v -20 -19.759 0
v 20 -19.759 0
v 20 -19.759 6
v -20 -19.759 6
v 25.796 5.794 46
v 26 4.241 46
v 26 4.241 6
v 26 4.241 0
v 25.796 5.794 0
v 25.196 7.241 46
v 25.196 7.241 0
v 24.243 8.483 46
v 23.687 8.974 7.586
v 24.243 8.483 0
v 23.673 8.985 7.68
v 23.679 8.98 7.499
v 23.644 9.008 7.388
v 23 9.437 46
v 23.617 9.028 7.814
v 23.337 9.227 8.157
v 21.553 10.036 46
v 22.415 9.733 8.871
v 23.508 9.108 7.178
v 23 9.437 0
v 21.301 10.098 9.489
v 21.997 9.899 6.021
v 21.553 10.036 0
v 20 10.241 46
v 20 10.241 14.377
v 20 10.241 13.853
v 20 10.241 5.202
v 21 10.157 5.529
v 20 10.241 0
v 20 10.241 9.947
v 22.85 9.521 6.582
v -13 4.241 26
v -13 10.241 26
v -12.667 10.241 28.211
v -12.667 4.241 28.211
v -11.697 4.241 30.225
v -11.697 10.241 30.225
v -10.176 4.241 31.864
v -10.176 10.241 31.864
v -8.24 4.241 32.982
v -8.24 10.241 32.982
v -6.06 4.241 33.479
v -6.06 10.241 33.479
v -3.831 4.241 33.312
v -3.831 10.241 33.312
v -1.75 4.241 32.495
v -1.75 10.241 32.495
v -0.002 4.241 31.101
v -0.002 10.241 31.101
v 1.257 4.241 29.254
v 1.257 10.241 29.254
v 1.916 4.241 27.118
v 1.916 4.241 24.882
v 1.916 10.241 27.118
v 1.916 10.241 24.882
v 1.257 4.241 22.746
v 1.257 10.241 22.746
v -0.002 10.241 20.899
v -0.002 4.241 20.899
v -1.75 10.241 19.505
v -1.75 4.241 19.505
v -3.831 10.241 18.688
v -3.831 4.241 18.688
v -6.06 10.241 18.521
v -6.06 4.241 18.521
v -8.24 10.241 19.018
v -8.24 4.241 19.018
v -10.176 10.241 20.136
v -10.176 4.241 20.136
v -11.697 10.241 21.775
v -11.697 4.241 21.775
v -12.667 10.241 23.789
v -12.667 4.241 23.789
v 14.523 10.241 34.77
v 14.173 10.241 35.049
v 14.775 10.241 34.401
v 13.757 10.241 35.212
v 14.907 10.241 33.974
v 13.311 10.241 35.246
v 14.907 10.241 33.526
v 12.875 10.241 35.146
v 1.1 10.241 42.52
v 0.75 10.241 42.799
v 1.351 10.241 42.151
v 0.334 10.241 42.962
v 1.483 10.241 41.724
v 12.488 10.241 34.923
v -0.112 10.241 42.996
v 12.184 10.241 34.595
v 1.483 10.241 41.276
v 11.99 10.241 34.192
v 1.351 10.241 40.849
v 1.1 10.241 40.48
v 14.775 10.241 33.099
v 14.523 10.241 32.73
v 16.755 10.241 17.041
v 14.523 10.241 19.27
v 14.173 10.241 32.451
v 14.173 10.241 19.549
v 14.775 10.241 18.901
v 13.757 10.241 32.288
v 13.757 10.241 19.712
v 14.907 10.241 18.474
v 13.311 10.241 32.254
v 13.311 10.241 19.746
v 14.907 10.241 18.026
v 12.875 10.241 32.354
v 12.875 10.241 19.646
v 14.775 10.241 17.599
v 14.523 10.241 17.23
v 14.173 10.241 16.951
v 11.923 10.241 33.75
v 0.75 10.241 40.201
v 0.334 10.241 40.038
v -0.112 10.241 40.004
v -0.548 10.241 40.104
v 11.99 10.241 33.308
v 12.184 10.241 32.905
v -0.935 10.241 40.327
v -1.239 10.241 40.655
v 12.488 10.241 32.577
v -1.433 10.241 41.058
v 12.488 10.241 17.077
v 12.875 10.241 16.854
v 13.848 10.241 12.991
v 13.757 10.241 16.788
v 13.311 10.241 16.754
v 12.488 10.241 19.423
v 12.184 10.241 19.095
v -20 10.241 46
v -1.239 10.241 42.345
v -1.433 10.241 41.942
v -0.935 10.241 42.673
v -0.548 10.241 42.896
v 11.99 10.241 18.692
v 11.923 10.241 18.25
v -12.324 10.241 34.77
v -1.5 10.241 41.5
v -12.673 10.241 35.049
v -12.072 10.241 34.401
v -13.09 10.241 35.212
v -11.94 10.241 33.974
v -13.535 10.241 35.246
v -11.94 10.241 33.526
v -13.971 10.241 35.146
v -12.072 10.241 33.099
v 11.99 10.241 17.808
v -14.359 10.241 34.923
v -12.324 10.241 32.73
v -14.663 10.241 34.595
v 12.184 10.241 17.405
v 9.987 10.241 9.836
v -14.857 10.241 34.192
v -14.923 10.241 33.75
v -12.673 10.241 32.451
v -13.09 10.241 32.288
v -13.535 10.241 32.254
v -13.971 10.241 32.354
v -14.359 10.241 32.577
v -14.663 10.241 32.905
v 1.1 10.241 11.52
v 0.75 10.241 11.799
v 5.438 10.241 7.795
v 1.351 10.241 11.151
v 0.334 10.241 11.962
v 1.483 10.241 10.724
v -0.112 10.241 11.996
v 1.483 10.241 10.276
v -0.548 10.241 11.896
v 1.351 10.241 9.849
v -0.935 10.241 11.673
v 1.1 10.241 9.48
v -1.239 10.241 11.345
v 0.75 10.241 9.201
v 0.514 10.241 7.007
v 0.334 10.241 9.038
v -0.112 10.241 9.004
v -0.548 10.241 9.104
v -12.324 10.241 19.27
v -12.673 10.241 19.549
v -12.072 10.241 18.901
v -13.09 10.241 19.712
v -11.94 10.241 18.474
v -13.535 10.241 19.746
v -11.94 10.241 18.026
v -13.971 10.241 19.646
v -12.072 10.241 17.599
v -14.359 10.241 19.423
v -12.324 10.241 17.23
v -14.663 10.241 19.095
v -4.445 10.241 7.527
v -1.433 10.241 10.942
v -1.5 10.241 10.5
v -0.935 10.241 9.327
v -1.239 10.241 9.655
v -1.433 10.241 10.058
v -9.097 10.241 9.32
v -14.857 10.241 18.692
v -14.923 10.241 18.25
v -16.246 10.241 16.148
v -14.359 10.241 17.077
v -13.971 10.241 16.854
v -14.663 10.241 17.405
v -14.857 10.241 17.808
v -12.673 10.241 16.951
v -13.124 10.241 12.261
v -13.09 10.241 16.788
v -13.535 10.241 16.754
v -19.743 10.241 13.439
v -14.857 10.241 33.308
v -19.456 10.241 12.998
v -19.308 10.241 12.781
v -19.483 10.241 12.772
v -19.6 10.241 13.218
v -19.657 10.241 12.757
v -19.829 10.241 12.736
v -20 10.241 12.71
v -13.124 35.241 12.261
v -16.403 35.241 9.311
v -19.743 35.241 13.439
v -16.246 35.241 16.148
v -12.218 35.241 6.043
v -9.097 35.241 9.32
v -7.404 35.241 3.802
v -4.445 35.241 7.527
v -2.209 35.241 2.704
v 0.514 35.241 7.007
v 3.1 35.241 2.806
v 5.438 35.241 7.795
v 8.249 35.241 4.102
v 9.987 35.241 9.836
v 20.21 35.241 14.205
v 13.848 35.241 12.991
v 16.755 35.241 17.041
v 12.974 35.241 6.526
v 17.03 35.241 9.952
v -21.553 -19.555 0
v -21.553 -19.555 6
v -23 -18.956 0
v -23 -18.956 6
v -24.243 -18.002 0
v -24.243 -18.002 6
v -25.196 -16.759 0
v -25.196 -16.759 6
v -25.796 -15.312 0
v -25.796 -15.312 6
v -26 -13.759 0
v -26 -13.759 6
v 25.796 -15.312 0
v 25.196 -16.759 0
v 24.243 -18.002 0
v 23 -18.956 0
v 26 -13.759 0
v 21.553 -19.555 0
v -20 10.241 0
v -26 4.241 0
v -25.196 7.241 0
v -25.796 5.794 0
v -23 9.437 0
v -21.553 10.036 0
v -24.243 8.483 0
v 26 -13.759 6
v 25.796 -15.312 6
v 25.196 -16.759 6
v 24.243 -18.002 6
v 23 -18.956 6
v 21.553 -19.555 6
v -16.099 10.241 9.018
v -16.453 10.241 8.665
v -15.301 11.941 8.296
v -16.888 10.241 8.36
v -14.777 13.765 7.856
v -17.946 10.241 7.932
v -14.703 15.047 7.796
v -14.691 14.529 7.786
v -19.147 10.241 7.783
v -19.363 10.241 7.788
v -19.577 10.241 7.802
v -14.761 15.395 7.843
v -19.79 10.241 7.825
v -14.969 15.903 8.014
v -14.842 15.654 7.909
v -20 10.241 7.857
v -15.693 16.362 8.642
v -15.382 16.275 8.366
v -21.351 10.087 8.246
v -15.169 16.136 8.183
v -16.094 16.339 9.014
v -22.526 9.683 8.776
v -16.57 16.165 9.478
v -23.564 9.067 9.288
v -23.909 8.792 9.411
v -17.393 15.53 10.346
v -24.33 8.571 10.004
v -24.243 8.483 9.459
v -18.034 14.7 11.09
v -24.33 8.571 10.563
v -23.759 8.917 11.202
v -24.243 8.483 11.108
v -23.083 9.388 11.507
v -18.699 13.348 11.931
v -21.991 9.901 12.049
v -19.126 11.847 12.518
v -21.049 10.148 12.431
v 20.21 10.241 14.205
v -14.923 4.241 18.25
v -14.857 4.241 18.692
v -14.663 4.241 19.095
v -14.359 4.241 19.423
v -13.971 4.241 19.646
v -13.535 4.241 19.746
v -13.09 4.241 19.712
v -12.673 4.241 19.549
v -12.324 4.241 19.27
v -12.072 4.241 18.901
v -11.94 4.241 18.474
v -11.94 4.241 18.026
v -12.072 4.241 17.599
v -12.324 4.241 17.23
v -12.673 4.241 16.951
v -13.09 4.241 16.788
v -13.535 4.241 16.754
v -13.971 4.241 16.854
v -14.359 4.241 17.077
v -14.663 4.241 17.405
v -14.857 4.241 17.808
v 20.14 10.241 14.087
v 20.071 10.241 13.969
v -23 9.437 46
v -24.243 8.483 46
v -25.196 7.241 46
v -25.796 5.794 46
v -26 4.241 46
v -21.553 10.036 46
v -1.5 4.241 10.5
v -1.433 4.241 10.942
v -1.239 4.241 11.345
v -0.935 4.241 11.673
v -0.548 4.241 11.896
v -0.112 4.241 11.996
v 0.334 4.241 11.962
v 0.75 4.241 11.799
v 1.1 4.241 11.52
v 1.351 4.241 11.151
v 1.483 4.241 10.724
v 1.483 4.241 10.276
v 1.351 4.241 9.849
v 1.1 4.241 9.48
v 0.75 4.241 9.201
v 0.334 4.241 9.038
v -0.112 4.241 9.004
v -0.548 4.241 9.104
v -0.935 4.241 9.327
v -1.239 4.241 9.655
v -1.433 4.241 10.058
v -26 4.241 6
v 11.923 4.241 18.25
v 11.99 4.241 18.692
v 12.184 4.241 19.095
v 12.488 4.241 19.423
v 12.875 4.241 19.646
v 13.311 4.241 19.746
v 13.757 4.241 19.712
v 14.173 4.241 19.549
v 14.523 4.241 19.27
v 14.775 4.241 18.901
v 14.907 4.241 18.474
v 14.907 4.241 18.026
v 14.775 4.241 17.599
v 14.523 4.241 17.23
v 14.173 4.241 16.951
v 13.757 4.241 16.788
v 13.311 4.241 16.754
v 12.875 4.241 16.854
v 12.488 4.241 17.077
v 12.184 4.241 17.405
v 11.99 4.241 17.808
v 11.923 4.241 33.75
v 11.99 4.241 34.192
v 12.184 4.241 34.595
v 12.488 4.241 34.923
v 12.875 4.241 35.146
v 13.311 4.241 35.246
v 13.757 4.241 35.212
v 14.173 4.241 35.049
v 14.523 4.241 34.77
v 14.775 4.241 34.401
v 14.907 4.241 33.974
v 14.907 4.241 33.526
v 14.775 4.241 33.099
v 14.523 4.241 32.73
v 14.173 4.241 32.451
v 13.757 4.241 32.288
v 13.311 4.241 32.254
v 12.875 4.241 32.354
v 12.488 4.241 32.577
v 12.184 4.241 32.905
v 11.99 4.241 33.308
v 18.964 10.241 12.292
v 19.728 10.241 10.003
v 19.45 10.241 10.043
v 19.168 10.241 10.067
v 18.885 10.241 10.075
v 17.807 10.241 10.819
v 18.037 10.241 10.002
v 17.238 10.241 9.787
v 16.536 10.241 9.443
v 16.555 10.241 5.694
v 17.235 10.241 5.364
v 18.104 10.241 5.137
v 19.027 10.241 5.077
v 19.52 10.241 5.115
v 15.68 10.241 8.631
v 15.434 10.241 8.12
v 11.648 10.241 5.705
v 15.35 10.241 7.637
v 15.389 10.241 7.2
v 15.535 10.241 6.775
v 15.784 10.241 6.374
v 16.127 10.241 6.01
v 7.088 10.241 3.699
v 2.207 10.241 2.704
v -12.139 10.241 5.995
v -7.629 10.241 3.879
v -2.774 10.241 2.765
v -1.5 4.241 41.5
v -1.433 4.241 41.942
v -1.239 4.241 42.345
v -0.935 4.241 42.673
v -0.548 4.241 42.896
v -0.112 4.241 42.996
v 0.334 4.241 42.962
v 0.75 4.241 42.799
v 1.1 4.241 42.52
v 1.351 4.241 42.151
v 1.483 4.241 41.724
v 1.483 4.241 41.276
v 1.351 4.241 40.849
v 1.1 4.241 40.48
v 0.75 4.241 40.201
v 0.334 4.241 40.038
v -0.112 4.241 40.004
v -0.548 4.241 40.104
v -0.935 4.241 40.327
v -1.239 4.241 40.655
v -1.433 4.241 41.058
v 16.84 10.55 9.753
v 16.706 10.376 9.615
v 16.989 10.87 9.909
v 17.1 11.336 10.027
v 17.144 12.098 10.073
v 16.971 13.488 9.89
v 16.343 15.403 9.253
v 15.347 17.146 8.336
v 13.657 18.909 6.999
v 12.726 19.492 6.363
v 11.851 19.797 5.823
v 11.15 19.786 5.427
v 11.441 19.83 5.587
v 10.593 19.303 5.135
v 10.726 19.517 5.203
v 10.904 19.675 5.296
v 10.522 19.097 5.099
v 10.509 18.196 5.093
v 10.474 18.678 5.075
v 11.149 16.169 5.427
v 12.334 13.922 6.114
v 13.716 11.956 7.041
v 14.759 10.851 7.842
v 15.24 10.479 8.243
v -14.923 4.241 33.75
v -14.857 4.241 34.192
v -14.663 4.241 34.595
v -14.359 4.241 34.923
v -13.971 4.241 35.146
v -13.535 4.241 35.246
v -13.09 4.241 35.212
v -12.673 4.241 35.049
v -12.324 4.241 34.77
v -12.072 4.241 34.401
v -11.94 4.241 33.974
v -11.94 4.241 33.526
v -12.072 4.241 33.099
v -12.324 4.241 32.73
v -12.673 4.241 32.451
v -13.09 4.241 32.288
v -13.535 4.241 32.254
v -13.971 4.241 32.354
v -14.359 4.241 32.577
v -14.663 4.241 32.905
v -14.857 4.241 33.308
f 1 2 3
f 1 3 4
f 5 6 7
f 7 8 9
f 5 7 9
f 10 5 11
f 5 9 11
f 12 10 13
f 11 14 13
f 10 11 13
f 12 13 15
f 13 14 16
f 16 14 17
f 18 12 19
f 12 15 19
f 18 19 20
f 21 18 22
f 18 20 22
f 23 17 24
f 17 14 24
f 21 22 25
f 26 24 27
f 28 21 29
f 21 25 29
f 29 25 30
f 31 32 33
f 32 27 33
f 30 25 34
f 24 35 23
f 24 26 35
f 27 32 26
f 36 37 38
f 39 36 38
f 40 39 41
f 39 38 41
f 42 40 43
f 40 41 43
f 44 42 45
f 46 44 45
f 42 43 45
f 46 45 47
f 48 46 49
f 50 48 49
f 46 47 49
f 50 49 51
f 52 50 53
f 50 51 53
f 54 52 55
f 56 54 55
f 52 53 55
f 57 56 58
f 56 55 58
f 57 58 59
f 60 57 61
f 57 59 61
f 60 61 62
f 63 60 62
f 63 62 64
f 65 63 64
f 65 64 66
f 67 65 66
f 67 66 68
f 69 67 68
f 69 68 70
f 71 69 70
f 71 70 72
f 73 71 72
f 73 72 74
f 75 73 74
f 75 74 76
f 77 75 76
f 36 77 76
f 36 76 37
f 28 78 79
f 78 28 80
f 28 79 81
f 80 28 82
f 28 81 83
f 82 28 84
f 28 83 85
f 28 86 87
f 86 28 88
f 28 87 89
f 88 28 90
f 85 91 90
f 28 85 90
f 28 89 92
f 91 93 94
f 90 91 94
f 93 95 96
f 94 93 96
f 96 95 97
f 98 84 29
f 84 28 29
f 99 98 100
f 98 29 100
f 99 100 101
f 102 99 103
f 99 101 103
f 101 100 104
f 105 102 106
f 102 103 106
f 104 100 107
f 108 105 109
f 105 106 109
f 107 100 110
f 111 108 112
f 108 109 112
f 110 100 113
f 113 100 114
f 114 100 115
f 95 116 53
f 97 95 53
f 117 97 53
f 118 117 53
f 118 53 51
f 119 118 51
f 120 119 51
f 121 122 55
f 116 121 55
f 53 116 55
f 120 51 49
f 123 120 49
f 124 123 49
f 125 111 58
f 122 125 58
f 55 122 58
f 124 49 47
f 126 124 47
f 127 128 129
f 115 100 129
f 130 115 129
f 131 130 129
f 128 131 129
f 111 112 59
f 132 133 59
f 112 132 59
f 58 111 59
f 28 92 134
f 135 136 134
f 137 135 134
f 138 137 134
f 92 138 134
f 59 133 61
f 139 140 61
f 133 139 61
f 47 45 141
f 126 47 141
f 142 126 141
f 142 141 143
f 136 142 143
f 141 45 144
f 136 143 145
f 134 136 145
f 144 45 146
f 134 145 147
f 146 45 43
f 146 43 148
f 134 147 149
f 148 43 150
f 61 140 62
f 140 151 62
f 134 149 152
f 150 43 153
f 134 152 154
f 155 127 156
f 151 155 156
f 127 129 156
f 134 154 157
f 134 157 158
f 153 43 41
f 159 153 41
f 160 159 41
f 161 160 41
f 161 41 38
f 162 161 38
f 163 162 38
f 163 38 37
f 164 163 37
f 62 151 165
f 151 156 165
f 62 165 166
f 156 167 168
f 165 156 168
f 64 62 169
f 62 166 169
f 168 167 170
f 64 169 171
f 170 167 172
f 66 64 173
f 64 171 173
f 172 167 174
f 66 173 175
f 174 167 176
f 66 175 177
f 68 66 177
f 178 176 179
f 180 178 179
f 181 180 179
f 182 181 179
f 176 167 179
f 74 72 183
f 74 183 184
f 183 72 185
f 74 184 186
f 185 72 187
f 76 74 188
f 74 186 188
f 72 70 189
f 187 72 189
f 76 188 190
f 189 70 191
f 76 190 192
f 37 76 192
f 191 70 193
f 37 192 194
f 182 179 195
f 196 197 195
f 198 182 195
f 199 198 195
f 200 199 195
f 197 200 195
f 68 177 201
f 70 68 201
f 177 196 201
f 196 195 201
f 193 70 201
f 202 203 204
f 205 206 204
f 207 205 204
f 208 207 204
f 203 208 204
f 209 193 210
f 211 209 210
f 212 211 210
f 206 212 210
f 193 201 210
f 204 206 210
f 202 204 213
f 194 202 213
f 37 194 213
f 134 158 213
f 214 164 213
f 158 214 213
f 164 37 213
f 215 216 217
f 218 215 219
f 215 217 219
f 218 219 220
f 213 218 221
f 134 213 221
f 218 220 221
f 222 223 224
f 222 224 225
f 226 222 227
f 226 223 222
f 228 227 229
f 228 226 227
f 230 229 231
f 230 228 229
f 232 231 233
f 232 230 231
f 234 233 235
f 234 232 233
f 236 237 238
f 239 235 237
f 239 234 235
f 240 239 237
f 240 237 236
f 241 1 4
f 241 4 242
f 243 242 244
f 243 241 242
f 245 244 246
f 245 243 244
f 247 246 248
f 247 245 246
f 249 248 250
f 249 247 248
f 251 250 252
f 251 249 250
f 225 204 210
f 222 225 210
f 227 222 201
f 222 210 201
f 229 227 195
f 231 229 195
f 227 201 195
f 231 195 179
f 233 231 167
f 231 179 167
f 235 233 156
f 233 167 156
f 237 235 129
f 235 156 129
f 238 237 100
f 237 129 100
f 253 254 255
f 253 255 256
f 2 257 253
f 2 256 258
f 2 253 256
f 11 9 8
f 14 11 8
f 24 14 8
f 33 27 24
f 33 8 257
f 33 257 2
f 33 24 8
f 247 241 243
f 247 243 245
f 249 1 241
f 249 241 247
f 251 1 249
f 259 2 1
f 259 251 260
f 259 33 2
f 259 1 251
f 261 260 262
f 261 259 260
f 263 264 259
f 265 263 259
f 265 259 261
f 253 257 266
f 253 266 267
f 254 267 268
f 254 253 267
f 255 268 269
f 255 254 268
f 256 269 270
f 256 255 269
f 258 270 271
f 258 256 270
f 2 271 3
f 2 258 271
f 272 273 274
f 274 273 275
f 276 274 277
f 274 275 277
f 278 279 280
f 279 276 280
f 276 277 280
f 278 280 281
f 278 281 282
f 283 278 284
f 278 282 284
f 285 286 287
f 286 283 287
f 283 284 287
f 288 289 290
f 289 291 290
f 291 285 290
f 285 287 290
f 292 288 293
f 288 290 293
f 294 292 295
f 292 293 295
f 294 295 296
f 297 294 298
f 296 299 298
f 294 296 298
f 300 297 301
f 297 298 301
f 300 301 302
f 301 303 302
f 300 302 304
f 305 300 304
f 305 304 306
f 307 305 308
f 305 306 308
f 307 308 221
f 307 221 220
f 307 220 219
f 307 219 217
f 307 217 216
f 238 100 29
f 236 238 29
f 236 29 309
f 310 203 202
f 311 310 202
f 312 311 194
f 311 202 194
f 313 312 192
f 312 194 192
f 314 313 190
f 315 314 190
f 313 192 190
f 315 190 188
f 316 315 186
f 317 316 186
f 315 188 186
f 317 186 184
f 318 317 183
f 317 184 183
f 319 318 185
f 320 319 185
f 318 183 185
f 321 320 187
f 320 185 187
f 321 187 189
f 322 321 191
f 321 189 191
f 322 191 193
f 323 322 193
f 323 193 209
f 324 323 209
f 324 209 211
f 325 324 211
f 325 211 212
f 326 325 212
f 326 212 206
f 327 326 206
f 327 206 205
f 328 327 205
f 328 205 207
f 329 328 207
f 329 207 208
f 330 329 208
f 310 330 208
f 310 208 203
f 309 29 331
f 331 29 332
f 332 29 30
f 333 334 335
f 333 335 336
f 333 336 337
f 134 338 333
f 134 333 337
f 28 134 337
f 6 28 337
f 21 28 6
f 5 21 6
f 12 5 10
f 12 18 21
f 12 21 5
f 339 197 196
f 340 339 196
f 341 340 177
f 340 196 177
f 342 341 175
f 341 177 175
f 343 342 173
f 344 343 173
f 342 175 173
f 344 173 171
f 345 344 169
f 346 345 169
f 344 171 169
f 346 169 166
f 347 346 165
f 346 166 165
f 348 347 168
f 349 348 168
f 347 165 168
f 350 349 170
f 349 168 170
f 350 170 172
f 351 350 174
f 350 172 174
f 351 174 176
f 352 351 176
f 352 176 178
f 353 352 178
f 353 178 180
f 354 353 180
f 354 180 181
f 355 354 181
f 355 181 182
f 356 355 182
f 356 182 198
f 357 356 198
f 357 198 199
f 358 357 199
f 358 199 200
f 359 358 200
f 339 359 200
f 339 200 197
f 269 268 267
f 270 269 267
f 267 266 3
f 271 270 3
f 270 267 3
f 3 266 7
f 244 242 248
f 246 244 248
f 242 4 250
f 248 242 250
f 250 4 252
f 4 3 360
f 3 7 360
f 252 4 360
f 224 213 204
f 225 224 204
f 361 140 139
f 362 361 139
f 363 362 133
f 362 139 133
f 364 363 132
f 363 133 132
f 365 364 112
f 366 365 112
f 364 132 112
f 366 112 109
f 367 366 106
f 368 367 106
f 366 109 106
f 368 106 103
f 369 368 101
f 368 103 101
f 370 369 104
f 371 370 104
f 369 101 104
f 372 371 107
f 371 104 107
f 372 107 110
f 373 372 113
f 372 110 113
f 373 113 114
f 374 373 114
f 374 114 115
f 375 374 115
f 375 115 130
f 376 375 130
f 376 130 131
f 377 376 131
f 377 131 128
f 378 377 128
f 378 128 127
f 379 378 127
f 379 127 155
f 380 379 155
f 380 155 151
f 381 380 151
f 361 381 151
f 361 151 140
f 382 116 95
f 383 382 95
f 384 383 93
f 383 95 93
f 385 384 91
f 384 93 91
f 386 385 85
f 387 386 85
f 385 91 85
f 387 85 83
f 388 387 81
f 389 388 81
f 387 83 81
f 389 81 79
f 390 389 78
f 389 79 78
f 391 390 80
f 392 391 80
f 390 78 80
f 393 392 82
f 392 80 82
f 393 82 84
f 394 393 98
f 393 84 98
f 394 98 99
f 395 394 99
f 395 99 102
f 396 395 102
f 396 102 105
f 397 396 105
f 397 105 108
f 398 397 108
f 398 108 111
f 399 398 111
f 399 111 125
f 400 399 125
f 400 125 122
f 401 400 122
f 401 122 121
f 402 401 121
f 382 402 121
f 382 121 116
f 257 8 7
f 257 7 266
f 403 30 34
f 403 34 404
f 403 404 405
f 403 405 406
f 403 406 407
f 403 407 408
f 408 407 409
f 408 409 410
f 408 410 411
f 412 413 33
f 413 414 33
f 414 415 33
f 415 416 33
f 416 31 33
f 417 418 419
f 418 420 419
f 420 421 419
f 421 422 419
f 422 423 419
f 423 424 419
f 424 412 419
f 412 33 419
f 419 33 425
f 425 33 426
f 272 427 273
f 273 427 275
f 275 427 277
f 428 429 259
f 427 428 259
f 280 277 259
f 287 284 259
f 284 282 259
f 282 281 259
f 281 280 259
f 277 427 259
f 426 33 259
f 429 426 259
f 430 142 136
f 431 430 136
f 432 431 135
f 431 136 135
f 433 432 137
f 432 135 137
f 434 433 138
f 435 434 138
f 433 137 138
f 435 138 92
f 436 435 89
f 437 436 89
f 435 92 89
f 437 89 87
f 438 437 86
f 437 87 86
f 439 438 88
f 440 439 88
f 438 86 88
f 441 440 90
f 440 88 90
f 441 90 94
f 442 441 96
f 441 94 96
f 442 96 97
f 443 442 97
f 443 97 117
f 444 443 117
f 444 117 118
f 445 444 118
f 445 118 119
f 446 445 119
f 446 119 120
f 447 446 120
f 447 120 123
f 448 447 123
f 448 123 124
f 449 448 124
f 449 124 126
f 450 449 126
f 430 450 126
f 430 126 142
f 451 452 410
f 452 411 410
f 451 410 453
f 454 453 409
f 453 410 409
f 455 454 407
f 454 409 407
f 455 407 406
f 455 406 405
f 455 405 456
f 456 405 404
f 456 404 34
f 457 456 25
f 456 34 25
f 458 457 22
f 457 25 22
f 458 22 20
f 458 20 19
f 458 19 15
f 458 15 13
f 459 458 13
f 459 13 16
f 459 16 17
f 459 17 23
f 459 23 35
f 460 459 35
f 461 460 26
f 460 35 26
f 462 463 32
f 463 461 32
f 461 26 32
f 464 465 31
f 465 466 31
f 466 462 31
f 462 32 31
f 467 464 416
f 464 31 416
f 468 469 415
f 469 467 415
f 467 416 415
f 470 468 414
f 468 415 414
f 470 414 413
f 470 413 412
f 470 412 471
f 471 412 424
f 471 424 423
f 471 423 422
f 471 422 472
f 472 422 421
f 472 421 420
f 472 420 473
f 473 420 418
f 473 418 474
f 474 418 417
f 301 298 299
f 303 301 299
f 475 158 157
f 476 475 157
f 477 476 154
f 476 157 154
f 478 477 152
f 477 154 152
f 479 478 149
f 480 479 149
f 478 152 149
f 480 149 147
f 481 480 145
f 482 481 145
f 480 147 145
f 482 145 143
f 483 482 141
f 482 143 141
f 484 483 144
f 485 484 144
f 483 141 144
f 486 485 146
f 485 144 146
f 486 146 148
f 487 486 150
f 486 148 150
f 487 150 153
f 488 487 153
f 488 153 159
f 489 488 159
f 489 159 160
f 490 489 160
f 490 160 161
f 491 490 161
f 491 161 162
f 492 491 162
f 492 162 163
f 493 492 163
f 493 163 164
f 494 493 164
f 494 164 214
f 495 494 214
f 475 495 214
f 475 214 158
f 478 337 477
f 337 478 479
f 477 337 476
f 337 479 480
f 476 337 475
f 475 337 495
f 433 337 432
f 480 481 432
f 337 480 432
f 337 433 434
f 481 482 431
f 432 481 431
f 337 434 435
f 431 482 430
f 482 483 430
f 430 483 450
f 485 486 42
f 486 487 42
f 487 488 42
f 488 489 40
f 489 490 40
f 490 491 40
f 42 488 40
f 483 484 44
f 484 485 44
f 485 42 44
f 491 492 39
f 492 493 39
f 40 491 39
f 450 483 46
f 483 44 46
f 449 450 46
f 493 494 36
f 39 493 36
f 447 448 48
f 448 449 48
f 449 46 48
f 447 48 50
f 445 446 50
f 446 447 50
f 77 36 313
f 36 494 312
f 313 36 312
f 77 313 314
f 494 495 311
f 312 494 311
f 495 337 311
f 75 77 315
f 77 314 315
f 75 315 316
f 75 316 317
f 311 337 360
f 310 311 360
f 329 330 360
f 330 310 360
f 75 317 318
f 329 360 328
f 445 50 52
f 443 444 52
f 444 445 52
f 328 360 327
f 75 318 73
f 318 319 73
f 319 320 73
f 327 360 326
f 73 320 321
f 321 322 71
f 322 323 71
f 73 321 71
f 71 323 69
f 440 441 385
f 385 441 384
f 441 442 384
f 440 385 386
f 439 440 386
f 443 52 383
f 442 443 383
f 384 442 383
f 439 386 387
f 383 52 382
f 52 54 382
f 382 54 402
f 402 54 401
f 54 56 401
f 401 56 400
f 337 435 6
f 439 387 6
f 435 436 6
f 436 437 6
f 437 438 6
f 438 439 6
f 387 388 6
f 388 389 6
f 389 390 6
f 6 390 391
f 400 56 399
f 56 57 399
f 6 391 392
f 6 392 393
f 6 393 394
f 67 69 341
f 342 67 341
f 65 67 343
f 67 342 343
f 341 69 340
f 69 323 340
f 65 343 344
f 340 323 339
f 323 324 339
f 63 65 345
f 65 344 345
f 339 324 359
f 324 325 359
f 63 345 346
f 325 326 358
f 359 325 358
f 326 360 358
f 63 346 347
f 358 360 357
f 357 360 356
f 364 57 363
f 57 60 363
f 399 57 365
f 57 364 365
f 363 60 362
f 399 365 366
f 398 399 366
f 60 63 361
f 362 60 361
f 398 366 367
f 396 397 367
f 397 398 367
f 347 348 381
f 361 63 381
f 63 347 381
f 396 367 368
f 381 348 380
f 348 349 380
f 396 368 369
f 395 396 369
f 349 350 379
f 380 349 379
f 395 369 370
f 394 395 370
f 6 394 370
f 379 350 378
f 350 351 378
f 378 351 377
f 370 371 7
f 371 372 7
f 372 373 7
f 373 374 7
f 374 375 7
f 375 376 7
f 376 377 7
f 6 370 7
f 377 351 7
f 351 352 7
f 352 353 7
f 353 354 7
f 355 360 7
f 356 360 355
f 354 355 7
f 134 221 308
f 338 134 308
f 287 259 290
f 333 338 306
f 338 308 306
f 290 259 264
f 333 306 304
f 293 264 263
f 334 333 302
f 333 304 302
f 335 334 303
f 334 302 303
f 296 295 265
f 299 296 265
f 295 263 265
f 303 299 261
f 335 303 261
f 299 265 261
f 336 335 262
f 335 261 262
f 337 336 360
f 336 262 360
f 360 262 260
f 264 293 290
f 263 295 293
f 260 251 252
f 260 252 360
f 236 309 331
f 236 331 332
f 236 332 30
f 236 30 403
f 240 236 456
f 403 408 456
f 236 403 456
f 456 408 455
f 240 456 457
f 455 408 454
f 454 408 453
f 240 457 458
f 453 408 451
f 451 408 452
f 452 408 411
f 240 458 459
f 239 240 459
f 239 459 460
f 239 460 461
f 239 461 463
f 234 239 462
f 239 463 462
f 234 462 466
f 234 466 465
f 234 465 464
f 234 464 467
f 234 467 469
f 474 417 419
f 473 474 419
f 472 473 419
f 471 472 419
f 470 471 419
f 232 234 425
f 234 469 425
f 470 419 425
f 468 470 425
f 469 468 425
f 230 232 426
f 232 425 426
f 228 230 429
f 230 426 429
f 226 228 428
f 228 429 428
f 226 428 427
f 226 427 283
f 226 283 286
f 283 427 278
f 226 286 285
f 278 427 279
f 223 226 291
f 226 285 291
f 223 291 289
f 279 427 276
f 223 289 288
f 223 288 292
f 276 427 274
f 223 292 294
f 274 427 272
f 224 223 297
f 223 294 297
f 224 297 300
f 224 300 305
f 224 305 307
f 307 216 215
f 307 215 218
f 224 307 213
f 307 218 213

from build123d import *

# Parameters (mm, degrees)
BOSS_EXTRUDE1_DEPTH      = 6
BOSS_EXTRUDE2_DEPTH      = 40
CUT_EXTRUDE1_REACH       = 62.762
SKETCH9_R                = 1.5
CUT_EXTRUDE2_REACH       = 62.762
SKETCH10_R               = 7.5
BOSS_EXTRUDE4_DEPTH      = 25
BOSS_EXTRUDE5_REACH      = 73.576
BOSS_EXTRUDE5_END_RADIUS = 23.4
SKETCH12_R               = 2.5
BOSS_EXTRUDE6_REACH      = 73.576
SKETCH14_R               = 2.5


with BuildPart() as part:
    # Sketch3 → Boss-Extrude1 (new body)
    with BuildSketch(Plane.XY):
        with BuildLine():
            Line((-20, 10.240601504), (20, 10.240601504))
            ThreePointArc((20, 10.240601504), (24.242640687, 8.483242191), (26, 4.240601504))
            Line((26, 4.240601504), (26, -13.759398496))
            ThreePointArc((26, -13.759398496), (24.242640687, -18.002039183), (20, -19.759398496))
            Line((20, -19.759398496), (-20, -19.759398496))
            ThreePointArc((-20, -19.759398496), (-24.242640687, -18.002039183), (-26, -13.759398496))
            Line((-26, -13.759398496), (-26, 4.240601504))
            ThreePointArc((-26, 4.240601504), (-24.242640687, 8.483242191), (-20, 10.240601504))
        make_face()
    extrude(amount=BOSS_EXTRUDE1_DEPTH)

    # Sketch4 → Boss-Extrude2 (add)
    with BuildSketch(Plane.XY.offset(6)):
        with BuildLine():
            Line((-26, 4.240601504), (26, 4.240601504))
            ThreePointArc((26, 4.240601504), (24.242640687, 8.483242191), (20, 10.240601504))
            Line((20, 10.240601504), (-20, 10.240601504))
            ThreePointArc((-20, 10.240601504), (-24.242640687, 8.483242191), (-26, 4.240601504))
        make_face()
    extrude(amount=BOSS_EXTRUDE2_DEPTH)

    # Sketch9 → Cut-Extrude1 (cut, up to next)
    with BuildSketch(Plane(origin=(0, 10.240601504, 0), x_dir=(1, 0, 0), z_dir=(0, 1, 0)), mode=Mode.PRIVATE) as cut_extrude1_sk1:
        with Locations(Location((0, -41.5, 0), (0, 0, 180))):
            Circle(SKETCH9_R)
    cut_extrude1_tool1 = extrude(cut_extrude1_sk1.sketch, amount=-CUT_EXTRUDE1_REACH, mode=Mode.PRIVATE) & part.part
    # Sketch9 → Cut-Extrude1 (cut, up to next)
    with BuildSketch(Plane(origin=(0, 10.240601504, 0), x_dir=(1, 0, 0), z_dir=(0, 1, 0)), mode=Mode.PRIVATE) as cut_extrude1_sk2:
        with Locations(Location((13.423393759, -33.75, 0), (0, 0, 180))):
            Circle(SKETCH9_R)
    cut_extrude1_tool2 = extrude(cut_extrude1_sk2.sketch, amount=-CUT_EXTRUDE1_REACH, mode=Mode.PRIVATE) & part.part
    # Sketch9 → Cut-Extrude1 (cut, up to next)
    with BuildSketch(Plane(origin=(0, 10.240601504, 0), x_dir=(1, 0, 0), z_dir=(0, 1, 0)), mode=Mode.PRIVATE) as cut_extrude1_sk3:
        with Locations(Location((-13.423393759, -33.75, 0), (0, 0, 180))):
            Circle(SKETCH9_R)
    cut_extrude1_tool3 = extrude(cut_extrude1_sk3.sketch, amount=-CUT_EXTRUDE1_REACH, mode=Mode.PRIVATE) & part.part
    # Sketch9 → Cut-Extrude1 (cut, up to next)
    with BuildSketch(Plane(origin=(0, 10.240601504, 0), x_dir=(1, 0, 0), z_dir=(0, 1, 0)), mode=Mode.PRIVATE) as cut_extrude1_sk4:
        with Locations(Location((-13.423393759, -18.25, 0), (0, 0, 180))):
            Circle(SKETCH9_R)
    cut_extrude1_tool4 = extrude(cut_extrude1_sk4.sketch, amount=-CUT_EXTRUDE1_REACH, mode=Mode.PRIVATE) & part.part
    # Sketch9 → Cut-Extrude1 (cut, up to next)
    with BuildSketch(Plane(origin=(0, 10.240601504, 0), x_dir=(1, 0, 0), z_dir=(0, 1, 0)), mode=Mode.PRIVATE) as cut_extrude1_sk5:
        with Locations(Location((0, -10.5, 0), (0, 0, 180))):
            Circle(SKETCH9_R)
    cut_extrude1_tool5 = extrude(cut_extrude1_sk5.sketch, amount=-CUT_EXTRUDE1_REACH, mode=Mode.PRIVATE) & part.part
    # Sketch9 → Cut-Extrude1 (cut, up to next)
    with BuildSketch(Plane(origin=(0, 10.240601504, 0), x_dir=(1, 0, 0), z_dir=(0, 1, 0)), mode=Mode.PRIVATE) as cut_extrude1_sk6:
        with Locations(Location((13.423393759, -18.25, 0), (0, 0, 180))):
            Circle(SKETCH9_R)
    cut_extrude1_tool6 = extrude(cut_extrude1_sk6.sketch, amount=-CUT_EXTRUDE1_REACH, mode=Mode.PRIVATE) & part.part
    add(cut_extrude1_tool1.solids().sort_by_distance((0, 10.240602, 41.5))[0], mode=Mode.SUBTRACT)
    add(cut_extrude1_tool2.solids().sort_by_distance((13.423394, 10.240602, 33.75))[0], mode=Mode.SUBTRACT)
    add(cut_extrude1_tool3.solids().sort_by_distance((-13.423394, 10.240602, 33.75))[0], mode=Mode.SUBTRACT)
    add(cut_extrude1_tool4.solids().sort_by_distance((-13.423394, 10.240602, 18.25))[0], mode=Mode.SUBTRACT)
    add(cut_extrude1_tool5.solids().sort_by_distance((0, 10.240602, 10.5))[0], mode=Mode.SUBTRACT)
    add(cut_extrude1_tool6.solids().sort_by_distance((13.423394, 10.240602, 18.25))[0], mode=Mode.SUBTRACT)

    # Sketch10 → Cut-Extrude2 (cut, up to next)
    with BuildSketch(Plane(origin=(0, 10.240601504, 0), x_dir=(1, 0, 0), z_dir=(0, 1, 0)), mode=Mode.PRIVATE) as cut_extrude2_sk1:
        with Locations(Location((-5.5, -26, 0), (0, 0, 180))):
            Circle(SKETCH10_R)
    cut_extrude2_tool1 = extrude(cut_extrude2_sk1.sketch, amount=-CUT_EXTRUDE2_REACH, mode=Mode.PRIVATE) & part.part
    add(cut_extrude2_tool1.solids().sort_by_distance((-5.5, 10.240602, 26))[0], mode=Mode.SUBTRACT)

    # Sketch11 → Boss-Extrude4 (add)
    with BuildSketch(Plane(origin=(0, 10.240601504, 0), x_dir=(1, 0, 0), z_dir=(0, 1, 0))):
        with BuildLine():
            Line((16.755404651, -17.041405524), (20.209569094, -14.204521331))
            ThreePointArc((20.209569094, -14.204521331), (0.448372053, -2.604296067), (-19.742781111, -13.438845833))
            Line((-19.742781111, -13.438845833), (-16.246095761, -16.147874721))
            ThreePointArc((-16.246095761, -16.147874721), (0.514245282, -7.006960438), (16.755404651, -17.041405524))
        make_face()
    extrude(amount=BOSS_EXTRUDE4_DEPTH)

    # Boss-Extrude5: up to this cylinder (the profile starts outside it)
    boss_extrude5_end = Plane(origin=(0, 6.683051, 26), z_dir=(0, -1, 0)) * Cylinder(BOSS_EXTRUDE5_END_RADIUS, 194.952, mode=Mode.PRIVATE)
    # Sketch12 → Boss-Extrude5 (add, up to the surface)
    with BuildSketch(Plane(origin=(7.879699248, -7.879699248, 0), x_dir=(0, 0, 1), z_dir=(-0.7071067811865489, 0.7071067811865462, 0)), mode=Mode.PRIVATE) as boss_extrude5_sk1:
        with Locations((7.574761701, 20.594839086)):
            Circle(SKETCH12_R)
    boss_extrude5_tool1 = extrude(boss_extrude5_sk1.sketch, amount=BOSS_EXTRUDE5_REACH, mode=Mode.PRIVATE) - boss_extrude5_end
    add(boss_extrude5_tool1.solids().sort_by_distance((22.44245, 6.683051, 7.574762))[0])

    # Sketch14 → Boss-Extrude6 (add, up to next)
    with BuildSketch(Plane(origin=(-7.879699248, -7.879699248, 0), x_dir=(0, 0, -1), z_dir=(0.7071067811865487, 0.7071067811865465, 0)), mode=Mode.PRIVATE) as boss_extrude6_sk1:
        with Locations((-10.283332747, 20.780524406)):
            Circle(SKETCH14_R)
    boss_extrude6_tool1 = extrude(boss_extrude6_sk1.sketch, amount=BOSS_EXTRUDE6_REACH, mode=Mode.PRIVATE) - part.part
    add(boss_extrude6_tool1.solids().sort_by_distance((-22.573749, 6.81435, 10.283333))[0])


solid = part.part
